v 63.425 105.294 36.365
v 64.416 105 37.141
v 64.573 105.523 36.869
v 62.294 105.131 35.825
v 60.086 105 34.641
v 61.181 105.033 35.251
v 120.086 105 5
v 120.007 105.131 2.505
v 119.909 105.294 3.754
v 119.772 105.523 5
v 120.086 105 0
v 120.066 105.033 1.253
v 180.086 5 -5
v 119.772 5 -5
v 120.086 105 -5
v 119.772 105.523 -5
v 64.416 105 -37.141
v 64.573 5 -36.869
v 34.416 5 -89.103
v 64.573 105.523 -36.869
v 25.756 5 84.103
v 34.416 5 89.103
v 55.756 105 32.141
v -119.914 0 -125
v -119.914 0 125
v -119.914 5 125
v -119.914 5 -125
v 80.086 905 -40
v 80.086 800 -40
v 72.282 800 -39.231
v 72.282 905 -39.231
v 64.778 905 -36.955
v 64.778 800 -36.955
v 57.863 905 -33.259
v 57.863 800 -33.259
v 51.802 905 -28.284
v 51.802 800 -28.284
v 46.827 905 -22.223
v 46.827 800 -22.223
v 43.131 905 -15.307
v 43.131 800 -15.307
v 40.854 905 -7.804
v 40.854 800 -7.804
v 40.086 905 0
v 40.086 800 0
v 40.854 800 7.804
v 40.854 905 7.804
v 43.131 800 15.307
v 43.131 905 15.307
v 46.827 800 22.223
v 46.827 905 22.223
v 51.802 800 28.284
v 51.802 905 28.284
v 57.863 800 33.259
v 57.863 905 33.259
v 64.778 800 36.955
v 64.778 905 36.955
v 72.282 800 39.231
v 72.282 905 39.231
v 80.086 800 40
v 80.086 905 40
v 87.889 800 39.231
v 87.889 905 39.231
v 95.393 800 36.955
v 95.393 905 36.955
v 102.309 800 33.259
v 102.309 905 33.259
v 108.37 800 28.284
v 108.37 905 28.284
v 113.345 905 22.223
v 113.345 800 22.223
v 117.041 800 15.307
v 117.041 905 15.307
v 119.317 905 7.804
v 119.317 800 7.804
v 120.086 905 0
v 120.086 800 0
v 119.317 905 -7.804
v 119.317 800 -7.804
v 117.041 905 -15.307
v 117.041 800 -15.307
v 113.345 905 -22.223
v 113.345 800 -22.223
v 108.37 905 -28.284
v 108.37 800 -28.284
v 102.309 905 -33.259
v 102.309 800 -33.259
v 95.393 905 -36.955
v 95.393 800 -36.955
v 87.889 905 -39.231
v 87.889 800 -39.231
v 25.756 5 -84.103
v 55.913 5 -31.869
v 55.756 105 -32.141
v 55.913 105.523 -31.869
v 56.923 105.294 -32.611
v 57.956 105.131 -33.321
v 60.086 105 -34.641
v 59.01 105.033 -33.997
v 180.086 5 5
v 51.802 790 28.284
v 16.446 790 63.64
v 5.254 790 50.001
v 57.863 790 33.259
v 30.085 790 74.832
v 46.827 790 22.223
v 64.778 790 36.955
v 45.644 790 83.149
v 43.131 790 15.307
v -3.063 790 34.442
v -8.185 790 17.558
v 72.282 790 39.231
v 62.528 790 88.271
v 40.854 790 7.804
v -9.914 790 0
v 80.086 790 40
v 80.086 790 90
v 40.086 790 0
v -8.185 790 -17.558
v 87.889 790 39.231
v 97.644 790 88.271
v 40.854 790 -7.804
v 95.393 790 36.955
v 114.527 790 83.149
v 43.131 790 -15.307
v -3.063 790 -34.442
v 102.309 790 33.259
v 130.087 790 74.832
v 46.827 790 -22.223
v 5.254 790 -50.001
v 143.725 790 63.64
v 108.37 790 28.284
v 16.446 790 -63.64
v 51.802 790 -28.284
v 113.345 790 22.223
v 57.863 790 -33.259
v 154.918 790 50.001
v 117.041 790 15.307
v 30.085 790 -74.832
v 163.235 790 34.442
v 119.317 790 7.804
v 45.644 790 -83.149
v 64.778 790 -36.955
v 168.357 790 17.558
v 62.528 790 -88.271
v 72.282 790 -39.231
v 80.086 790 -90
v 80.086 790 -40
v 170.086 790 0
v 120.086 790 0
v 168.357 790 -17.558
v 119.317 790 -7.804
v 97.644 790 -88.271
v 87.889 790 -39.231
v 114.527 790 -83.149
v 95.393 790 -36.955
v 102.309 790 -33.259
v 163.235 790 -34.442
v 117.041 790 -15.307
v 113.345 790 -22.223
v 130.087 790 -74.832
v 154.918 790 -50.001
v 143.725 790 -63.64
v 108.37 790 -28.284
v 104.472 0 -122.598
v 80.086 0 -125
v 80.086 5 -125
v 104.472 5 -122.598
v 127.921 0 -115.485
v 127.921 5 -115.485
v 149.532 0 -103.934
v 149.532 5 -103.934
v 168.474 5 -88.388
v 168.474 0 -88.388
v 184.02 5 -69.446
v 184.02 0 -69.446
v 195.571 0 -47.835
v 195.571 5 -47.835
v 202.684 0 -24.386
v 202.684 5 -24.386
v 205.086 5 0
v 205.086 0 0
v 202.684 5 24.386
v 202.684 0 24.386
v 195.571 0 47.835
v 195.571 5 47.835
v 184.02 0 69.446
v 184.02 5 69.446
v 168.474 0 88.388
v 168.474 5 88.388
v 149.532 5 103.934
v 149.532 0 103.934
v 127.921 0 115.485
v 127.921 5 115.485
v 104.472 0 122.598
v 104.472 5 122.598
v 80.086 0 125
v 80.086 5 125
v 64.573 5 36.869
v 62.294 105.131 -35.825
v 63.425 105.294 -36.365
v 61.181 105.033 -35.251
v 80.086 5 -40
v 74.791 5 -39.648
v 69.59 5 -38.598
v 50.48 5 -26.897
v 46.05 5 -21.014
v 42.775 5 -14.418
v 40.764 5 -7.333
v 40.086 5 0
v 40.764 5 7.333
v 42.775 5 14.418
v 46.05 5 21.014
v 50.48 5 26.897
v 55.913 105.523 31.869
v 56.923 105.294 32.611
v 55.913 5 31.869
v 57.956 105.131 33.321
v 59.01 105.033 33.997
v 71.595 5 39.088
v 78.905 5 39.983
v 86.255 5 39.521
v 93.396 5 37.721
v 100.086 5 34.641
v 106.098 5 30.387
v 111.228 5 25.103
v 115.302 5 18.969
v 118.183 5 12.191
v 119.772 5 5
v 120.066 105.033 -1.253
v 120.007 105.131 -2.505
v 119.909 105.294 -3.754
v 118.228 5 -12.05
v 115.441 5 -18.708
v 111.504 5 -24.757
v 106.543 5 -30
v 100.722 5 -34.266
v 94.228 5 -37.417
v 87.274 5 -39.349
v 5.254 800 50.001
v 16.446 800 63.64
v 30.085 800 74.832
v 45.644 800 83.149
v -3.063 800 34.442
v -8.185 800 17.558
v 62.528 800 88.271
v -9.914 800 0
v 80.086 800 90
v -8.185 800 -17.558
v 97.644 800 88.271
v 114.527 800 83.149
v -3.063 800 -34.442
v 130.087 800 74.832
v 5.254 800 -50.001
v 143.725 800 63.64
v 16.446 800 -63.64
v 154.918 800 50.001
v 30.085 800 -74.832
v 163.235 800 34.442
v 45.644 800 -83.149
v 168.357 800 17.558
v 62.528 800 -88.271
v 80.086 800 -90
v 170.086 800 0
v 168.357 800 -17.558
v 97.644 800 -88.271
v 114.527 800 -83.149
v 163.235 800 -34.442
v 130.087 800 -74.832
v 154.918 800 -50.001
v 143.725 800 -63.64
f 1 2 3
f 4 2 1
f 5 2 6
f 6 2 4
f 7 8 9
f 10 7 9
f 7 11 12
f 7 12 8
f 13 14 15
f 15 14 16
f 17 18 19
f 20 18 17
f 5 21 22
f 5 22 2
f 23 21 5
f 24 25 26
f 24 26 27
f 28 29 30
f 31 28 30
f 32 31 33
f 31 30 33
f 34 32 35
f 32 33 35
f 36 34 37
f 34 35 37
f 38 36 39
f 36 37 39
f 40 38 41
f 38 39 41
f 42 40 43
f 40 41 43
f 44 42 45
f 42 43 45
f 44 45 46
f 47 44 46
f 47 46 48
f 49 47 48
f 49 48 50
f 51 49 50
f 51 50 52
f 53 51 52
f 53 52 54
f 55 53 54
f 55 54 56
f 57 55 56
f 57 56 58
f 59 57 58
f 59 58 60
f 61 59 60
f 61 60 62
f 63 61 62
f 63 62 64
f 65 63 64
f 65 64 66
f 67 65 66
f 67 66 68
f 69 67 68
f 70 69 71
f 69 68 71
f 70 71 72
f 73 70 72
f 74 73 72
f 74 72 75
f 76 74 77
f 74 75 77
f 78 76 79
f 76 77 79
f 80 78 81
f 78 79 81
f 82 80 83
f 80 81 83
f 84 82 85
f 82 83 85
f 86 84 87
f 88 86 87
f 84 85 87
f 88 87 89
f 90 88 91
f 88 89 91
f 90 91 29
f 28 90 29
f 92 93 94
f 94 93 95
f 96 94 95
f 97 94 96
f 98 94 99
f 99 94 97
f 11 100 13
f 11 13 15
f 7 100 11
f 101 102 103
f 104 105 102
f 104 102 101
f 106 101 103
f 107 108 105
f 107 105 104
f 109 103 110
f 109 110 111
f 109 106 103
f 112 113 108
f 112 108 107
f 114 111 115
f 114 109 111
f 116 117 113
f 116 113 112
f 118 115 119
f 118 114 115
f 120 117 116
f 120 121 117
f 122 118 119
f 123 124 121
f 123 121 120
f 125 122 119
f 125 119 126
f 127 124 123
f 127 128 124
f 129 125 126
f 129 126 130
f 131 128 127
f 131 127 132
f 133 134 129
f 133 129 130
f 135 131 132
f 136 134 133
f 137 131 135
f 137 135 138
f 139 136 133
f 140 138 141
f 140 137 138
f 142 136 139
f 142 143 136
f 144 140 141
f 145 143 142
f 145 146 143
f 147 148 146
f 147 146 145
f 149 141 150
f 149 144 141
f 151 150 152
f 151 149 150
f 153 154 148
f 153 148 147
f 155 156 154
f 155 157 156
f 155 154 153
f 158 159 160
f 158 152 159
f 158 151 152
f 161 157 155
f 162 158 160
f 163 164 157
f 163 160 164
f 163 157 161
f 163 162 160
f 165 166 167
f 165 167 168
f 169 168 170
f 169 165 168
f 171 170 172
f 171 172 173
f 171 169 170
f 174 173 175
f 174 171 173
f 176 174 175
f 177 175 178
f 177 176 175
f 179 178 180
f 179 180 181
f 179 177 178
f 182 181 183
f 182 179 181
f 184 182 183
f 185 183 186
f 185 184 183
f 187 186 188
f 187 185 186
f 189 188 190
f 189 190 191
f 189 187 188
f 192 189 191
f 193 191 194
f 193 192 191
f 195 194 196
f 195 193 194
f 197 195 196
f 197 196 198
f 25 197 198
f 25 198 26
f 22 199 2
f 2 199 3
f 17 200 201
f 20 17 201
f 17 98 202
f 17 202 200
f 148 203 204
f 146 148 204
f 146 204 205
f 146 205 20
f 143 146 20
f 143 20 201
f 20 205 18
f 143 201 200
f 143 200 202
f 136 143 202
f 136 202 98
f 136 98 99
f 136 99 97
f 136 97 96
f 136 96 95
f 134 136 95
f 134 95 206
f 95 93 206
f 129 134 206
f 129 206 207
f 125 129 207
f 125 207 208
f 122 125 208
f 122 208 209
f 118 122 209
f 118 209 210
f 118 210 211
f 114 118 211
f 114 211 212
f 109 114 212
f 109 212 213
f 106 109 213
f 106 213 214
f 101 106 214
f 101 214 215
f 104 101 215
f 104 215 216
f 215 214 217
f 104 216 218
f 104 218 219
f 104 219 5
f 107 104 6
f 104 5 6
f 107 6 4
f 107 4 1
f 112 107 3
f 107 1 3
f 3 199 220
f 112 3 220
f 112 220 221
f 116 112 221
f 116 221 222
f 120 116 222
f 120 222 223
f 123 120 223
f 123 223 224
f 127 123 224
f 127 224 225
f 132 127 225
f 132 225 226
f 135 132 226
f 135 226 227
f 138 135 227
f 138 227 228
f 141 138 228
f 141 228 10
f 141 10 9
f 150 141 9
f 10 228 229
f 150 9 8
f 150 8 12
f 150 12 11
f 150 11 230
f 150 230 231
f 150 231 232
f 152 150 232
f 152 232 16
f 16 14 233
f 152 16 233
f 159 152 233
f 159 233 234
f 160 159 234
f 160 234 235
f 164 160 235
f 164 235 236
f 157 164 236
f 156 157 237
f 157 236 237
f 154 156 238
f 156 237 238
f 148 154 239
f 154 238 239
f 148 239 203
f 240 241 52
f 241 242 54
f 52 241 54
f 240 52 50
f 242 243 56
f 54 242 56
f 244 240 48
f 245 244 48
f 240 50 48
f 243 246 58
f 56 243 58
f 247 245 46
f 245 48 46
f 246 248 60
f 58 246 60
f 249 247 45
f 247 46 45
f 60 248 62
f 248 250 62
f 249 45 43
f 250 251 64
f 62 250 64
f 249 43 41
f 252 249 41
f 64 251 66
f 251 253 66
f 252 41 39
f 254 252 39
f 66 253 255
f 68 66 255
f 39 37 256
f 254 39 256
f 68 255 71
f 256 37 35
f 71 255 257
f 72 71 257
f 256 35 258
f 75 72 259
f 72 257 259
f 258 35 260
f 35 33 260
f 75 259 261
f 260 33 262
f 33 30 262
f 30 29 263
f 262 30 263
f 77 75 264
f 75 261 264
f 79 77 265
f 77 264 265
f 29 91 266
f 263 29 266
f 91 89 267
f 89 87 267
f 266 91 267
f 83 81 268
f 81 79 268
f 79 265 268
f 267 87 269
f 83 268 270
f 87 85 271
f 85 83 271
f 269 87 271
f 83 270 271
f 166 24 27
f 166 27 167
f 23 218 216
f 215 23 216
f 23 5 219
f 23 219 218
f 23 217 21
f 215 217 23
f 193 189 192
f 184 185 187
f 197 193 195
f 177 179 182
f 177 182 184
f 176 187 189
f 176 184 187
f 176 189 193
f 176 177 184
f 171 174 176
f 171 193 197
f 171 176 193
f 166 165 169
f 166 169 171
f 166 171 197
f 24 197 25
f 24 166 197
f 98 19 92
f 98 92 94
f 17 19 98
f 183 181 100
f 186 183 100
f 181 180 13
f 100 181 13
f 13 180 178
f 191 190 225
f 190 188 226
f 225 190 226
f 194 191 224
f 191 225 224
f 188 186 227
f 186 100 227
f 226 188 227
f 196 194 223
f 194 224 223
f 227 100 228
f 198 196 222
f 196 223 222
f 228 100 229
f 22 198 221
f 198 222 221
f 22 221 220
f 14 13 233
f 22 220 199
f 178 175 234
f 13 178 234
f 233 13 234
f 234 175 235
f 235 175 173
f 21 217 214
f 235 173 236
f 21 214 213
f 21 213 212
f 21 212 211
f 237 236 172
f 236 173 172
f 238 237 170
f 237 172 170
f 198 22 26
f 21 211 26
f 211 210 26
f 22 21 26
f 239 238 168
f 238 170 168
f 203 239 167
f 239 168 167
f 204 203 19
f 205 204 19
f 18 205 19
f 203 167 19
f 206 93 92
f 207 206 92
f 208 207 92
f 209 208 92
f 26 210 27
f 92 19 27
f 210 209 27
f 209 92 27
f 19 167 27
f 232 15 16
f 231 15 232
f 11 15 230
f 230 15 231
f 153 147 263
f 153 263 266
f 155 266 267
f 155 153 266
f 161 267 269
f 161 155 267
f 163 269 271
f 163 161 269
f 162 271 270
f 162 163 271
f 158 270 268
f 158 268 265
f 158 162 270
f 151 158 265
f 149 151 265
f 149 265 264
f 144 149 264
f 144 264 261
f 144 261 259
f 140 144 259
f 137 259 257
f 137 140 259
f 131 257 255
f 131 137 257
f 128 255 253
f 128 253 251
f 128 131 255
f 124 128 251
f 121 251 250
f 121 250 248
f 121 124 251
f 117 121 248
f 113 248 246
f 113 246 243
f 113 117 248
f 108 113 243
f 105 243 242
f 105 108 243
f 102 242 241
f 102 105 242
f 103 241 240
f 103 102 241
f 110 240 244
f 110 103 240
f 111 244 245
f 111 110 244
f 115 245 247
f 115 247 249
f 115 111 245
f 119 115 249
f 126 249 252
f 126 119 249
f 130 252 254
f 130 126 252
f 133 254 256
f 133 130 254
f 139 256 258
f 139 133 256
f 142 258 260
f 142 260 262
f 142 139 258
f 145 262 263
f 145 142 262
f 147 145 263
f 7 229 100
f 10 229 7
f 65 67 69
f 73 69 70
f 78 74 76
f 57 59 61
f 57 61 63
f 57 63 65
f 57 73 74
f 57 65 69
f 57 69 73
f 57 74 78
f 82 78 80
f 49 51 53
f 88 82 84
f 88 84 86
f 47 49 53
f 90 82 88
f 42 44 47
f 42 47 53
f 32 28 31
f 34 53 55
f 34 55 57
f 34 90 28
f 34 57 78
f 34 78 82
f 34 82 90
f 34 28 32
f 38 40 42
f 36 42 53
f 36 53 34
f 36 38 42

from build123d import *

# Parameters (mm, degrees)
EXTRUDE_1_DEPTH          = 5
SKETCH_2_R               = 40
EXTRUDE_2_DEPTH          = 900
SKETCH_3_R               = 90
EXTRUDE_3_DEPTH          = 10
EXTRUDE_6_DEPTH          = 5
PATTERN_CIRCULAR_1_COUNT = 3


with BuildPart() as part:
    # 草图1 → 凸台-拉伸1 (new body)
    with BuildSketch(Plane(origin=(0, 0, 0), x_dir=(1, 0, 0), z_dir=(0, 1, 0))):
        with BuildLine():
            Line((-119.91416309, -125), (-119.91416309, 125))
            Line((-119.91416309, 125), (80.08583691, 125))
            ThreePointArc((80.08583691, 125), (205.08583691, 0), (80.08583691, -125))
            Line((80.08583691, -125), (-119.91416309, -125))
        make_face()
    extrude(amount=EXTRUDE_1_DEPTH)

    # 草图2 → 凸台-拉伸2 (add)
    with BuildSketch(Plane(origin=(0, 5, 0), x_dir=(1, 0, 0), z_dir=(0, 1, 0))):
        with Locations(Location((80.08583691, 0, 0), (0, 0, 90))):
            Circle(SKETCH_2_R)
    extrude(amount=EXTRUDE_2_DEPTH)

    # 草图3 → 凸台-拉伸3 (add)
    with BuildSketch(Plane(origin=(0, 790, 0), x_dir=(-1, 0, 0), z_dir=(0, -1, 0))):
        with Locations(Location((-80.08583691, 0, 0), (0, 0, 90))):
            Circle(SKETCH_3_R)
    extrude(amount=-EXTRUDE_3_DEPTH)

    # 草图5 → 凸台-拉伸6 (add, symmetric)
    with BuildSketch(Plane.XY):
        Polygon((108.365396312, 5), (120.08583691, 5), (120.08583691, 105), (108.365396312, 124.534067663), align=None)
        Polygon((120.08583691, 5), (180.08583691, 5), (120.08583691, 105), align=None)
    extrude_6 = extrude(amount=EXTRUDE_6_DEPTH, both=True)

    # 阵列(圆周)1: 凸台-拉伸6 ×3 about axis
    pattern_circular_1_axis = Axis((80.08583691, 0, 0), (0, 1, 0))
    for i in range(1, PATTERN_CIRCULAR_1_COUNT):
        add(extrude_6.rotate(pattern_circular_1_axis, i * 360 / PATTERN_CIRCULAR_1_COUNT))


solid = part.part
